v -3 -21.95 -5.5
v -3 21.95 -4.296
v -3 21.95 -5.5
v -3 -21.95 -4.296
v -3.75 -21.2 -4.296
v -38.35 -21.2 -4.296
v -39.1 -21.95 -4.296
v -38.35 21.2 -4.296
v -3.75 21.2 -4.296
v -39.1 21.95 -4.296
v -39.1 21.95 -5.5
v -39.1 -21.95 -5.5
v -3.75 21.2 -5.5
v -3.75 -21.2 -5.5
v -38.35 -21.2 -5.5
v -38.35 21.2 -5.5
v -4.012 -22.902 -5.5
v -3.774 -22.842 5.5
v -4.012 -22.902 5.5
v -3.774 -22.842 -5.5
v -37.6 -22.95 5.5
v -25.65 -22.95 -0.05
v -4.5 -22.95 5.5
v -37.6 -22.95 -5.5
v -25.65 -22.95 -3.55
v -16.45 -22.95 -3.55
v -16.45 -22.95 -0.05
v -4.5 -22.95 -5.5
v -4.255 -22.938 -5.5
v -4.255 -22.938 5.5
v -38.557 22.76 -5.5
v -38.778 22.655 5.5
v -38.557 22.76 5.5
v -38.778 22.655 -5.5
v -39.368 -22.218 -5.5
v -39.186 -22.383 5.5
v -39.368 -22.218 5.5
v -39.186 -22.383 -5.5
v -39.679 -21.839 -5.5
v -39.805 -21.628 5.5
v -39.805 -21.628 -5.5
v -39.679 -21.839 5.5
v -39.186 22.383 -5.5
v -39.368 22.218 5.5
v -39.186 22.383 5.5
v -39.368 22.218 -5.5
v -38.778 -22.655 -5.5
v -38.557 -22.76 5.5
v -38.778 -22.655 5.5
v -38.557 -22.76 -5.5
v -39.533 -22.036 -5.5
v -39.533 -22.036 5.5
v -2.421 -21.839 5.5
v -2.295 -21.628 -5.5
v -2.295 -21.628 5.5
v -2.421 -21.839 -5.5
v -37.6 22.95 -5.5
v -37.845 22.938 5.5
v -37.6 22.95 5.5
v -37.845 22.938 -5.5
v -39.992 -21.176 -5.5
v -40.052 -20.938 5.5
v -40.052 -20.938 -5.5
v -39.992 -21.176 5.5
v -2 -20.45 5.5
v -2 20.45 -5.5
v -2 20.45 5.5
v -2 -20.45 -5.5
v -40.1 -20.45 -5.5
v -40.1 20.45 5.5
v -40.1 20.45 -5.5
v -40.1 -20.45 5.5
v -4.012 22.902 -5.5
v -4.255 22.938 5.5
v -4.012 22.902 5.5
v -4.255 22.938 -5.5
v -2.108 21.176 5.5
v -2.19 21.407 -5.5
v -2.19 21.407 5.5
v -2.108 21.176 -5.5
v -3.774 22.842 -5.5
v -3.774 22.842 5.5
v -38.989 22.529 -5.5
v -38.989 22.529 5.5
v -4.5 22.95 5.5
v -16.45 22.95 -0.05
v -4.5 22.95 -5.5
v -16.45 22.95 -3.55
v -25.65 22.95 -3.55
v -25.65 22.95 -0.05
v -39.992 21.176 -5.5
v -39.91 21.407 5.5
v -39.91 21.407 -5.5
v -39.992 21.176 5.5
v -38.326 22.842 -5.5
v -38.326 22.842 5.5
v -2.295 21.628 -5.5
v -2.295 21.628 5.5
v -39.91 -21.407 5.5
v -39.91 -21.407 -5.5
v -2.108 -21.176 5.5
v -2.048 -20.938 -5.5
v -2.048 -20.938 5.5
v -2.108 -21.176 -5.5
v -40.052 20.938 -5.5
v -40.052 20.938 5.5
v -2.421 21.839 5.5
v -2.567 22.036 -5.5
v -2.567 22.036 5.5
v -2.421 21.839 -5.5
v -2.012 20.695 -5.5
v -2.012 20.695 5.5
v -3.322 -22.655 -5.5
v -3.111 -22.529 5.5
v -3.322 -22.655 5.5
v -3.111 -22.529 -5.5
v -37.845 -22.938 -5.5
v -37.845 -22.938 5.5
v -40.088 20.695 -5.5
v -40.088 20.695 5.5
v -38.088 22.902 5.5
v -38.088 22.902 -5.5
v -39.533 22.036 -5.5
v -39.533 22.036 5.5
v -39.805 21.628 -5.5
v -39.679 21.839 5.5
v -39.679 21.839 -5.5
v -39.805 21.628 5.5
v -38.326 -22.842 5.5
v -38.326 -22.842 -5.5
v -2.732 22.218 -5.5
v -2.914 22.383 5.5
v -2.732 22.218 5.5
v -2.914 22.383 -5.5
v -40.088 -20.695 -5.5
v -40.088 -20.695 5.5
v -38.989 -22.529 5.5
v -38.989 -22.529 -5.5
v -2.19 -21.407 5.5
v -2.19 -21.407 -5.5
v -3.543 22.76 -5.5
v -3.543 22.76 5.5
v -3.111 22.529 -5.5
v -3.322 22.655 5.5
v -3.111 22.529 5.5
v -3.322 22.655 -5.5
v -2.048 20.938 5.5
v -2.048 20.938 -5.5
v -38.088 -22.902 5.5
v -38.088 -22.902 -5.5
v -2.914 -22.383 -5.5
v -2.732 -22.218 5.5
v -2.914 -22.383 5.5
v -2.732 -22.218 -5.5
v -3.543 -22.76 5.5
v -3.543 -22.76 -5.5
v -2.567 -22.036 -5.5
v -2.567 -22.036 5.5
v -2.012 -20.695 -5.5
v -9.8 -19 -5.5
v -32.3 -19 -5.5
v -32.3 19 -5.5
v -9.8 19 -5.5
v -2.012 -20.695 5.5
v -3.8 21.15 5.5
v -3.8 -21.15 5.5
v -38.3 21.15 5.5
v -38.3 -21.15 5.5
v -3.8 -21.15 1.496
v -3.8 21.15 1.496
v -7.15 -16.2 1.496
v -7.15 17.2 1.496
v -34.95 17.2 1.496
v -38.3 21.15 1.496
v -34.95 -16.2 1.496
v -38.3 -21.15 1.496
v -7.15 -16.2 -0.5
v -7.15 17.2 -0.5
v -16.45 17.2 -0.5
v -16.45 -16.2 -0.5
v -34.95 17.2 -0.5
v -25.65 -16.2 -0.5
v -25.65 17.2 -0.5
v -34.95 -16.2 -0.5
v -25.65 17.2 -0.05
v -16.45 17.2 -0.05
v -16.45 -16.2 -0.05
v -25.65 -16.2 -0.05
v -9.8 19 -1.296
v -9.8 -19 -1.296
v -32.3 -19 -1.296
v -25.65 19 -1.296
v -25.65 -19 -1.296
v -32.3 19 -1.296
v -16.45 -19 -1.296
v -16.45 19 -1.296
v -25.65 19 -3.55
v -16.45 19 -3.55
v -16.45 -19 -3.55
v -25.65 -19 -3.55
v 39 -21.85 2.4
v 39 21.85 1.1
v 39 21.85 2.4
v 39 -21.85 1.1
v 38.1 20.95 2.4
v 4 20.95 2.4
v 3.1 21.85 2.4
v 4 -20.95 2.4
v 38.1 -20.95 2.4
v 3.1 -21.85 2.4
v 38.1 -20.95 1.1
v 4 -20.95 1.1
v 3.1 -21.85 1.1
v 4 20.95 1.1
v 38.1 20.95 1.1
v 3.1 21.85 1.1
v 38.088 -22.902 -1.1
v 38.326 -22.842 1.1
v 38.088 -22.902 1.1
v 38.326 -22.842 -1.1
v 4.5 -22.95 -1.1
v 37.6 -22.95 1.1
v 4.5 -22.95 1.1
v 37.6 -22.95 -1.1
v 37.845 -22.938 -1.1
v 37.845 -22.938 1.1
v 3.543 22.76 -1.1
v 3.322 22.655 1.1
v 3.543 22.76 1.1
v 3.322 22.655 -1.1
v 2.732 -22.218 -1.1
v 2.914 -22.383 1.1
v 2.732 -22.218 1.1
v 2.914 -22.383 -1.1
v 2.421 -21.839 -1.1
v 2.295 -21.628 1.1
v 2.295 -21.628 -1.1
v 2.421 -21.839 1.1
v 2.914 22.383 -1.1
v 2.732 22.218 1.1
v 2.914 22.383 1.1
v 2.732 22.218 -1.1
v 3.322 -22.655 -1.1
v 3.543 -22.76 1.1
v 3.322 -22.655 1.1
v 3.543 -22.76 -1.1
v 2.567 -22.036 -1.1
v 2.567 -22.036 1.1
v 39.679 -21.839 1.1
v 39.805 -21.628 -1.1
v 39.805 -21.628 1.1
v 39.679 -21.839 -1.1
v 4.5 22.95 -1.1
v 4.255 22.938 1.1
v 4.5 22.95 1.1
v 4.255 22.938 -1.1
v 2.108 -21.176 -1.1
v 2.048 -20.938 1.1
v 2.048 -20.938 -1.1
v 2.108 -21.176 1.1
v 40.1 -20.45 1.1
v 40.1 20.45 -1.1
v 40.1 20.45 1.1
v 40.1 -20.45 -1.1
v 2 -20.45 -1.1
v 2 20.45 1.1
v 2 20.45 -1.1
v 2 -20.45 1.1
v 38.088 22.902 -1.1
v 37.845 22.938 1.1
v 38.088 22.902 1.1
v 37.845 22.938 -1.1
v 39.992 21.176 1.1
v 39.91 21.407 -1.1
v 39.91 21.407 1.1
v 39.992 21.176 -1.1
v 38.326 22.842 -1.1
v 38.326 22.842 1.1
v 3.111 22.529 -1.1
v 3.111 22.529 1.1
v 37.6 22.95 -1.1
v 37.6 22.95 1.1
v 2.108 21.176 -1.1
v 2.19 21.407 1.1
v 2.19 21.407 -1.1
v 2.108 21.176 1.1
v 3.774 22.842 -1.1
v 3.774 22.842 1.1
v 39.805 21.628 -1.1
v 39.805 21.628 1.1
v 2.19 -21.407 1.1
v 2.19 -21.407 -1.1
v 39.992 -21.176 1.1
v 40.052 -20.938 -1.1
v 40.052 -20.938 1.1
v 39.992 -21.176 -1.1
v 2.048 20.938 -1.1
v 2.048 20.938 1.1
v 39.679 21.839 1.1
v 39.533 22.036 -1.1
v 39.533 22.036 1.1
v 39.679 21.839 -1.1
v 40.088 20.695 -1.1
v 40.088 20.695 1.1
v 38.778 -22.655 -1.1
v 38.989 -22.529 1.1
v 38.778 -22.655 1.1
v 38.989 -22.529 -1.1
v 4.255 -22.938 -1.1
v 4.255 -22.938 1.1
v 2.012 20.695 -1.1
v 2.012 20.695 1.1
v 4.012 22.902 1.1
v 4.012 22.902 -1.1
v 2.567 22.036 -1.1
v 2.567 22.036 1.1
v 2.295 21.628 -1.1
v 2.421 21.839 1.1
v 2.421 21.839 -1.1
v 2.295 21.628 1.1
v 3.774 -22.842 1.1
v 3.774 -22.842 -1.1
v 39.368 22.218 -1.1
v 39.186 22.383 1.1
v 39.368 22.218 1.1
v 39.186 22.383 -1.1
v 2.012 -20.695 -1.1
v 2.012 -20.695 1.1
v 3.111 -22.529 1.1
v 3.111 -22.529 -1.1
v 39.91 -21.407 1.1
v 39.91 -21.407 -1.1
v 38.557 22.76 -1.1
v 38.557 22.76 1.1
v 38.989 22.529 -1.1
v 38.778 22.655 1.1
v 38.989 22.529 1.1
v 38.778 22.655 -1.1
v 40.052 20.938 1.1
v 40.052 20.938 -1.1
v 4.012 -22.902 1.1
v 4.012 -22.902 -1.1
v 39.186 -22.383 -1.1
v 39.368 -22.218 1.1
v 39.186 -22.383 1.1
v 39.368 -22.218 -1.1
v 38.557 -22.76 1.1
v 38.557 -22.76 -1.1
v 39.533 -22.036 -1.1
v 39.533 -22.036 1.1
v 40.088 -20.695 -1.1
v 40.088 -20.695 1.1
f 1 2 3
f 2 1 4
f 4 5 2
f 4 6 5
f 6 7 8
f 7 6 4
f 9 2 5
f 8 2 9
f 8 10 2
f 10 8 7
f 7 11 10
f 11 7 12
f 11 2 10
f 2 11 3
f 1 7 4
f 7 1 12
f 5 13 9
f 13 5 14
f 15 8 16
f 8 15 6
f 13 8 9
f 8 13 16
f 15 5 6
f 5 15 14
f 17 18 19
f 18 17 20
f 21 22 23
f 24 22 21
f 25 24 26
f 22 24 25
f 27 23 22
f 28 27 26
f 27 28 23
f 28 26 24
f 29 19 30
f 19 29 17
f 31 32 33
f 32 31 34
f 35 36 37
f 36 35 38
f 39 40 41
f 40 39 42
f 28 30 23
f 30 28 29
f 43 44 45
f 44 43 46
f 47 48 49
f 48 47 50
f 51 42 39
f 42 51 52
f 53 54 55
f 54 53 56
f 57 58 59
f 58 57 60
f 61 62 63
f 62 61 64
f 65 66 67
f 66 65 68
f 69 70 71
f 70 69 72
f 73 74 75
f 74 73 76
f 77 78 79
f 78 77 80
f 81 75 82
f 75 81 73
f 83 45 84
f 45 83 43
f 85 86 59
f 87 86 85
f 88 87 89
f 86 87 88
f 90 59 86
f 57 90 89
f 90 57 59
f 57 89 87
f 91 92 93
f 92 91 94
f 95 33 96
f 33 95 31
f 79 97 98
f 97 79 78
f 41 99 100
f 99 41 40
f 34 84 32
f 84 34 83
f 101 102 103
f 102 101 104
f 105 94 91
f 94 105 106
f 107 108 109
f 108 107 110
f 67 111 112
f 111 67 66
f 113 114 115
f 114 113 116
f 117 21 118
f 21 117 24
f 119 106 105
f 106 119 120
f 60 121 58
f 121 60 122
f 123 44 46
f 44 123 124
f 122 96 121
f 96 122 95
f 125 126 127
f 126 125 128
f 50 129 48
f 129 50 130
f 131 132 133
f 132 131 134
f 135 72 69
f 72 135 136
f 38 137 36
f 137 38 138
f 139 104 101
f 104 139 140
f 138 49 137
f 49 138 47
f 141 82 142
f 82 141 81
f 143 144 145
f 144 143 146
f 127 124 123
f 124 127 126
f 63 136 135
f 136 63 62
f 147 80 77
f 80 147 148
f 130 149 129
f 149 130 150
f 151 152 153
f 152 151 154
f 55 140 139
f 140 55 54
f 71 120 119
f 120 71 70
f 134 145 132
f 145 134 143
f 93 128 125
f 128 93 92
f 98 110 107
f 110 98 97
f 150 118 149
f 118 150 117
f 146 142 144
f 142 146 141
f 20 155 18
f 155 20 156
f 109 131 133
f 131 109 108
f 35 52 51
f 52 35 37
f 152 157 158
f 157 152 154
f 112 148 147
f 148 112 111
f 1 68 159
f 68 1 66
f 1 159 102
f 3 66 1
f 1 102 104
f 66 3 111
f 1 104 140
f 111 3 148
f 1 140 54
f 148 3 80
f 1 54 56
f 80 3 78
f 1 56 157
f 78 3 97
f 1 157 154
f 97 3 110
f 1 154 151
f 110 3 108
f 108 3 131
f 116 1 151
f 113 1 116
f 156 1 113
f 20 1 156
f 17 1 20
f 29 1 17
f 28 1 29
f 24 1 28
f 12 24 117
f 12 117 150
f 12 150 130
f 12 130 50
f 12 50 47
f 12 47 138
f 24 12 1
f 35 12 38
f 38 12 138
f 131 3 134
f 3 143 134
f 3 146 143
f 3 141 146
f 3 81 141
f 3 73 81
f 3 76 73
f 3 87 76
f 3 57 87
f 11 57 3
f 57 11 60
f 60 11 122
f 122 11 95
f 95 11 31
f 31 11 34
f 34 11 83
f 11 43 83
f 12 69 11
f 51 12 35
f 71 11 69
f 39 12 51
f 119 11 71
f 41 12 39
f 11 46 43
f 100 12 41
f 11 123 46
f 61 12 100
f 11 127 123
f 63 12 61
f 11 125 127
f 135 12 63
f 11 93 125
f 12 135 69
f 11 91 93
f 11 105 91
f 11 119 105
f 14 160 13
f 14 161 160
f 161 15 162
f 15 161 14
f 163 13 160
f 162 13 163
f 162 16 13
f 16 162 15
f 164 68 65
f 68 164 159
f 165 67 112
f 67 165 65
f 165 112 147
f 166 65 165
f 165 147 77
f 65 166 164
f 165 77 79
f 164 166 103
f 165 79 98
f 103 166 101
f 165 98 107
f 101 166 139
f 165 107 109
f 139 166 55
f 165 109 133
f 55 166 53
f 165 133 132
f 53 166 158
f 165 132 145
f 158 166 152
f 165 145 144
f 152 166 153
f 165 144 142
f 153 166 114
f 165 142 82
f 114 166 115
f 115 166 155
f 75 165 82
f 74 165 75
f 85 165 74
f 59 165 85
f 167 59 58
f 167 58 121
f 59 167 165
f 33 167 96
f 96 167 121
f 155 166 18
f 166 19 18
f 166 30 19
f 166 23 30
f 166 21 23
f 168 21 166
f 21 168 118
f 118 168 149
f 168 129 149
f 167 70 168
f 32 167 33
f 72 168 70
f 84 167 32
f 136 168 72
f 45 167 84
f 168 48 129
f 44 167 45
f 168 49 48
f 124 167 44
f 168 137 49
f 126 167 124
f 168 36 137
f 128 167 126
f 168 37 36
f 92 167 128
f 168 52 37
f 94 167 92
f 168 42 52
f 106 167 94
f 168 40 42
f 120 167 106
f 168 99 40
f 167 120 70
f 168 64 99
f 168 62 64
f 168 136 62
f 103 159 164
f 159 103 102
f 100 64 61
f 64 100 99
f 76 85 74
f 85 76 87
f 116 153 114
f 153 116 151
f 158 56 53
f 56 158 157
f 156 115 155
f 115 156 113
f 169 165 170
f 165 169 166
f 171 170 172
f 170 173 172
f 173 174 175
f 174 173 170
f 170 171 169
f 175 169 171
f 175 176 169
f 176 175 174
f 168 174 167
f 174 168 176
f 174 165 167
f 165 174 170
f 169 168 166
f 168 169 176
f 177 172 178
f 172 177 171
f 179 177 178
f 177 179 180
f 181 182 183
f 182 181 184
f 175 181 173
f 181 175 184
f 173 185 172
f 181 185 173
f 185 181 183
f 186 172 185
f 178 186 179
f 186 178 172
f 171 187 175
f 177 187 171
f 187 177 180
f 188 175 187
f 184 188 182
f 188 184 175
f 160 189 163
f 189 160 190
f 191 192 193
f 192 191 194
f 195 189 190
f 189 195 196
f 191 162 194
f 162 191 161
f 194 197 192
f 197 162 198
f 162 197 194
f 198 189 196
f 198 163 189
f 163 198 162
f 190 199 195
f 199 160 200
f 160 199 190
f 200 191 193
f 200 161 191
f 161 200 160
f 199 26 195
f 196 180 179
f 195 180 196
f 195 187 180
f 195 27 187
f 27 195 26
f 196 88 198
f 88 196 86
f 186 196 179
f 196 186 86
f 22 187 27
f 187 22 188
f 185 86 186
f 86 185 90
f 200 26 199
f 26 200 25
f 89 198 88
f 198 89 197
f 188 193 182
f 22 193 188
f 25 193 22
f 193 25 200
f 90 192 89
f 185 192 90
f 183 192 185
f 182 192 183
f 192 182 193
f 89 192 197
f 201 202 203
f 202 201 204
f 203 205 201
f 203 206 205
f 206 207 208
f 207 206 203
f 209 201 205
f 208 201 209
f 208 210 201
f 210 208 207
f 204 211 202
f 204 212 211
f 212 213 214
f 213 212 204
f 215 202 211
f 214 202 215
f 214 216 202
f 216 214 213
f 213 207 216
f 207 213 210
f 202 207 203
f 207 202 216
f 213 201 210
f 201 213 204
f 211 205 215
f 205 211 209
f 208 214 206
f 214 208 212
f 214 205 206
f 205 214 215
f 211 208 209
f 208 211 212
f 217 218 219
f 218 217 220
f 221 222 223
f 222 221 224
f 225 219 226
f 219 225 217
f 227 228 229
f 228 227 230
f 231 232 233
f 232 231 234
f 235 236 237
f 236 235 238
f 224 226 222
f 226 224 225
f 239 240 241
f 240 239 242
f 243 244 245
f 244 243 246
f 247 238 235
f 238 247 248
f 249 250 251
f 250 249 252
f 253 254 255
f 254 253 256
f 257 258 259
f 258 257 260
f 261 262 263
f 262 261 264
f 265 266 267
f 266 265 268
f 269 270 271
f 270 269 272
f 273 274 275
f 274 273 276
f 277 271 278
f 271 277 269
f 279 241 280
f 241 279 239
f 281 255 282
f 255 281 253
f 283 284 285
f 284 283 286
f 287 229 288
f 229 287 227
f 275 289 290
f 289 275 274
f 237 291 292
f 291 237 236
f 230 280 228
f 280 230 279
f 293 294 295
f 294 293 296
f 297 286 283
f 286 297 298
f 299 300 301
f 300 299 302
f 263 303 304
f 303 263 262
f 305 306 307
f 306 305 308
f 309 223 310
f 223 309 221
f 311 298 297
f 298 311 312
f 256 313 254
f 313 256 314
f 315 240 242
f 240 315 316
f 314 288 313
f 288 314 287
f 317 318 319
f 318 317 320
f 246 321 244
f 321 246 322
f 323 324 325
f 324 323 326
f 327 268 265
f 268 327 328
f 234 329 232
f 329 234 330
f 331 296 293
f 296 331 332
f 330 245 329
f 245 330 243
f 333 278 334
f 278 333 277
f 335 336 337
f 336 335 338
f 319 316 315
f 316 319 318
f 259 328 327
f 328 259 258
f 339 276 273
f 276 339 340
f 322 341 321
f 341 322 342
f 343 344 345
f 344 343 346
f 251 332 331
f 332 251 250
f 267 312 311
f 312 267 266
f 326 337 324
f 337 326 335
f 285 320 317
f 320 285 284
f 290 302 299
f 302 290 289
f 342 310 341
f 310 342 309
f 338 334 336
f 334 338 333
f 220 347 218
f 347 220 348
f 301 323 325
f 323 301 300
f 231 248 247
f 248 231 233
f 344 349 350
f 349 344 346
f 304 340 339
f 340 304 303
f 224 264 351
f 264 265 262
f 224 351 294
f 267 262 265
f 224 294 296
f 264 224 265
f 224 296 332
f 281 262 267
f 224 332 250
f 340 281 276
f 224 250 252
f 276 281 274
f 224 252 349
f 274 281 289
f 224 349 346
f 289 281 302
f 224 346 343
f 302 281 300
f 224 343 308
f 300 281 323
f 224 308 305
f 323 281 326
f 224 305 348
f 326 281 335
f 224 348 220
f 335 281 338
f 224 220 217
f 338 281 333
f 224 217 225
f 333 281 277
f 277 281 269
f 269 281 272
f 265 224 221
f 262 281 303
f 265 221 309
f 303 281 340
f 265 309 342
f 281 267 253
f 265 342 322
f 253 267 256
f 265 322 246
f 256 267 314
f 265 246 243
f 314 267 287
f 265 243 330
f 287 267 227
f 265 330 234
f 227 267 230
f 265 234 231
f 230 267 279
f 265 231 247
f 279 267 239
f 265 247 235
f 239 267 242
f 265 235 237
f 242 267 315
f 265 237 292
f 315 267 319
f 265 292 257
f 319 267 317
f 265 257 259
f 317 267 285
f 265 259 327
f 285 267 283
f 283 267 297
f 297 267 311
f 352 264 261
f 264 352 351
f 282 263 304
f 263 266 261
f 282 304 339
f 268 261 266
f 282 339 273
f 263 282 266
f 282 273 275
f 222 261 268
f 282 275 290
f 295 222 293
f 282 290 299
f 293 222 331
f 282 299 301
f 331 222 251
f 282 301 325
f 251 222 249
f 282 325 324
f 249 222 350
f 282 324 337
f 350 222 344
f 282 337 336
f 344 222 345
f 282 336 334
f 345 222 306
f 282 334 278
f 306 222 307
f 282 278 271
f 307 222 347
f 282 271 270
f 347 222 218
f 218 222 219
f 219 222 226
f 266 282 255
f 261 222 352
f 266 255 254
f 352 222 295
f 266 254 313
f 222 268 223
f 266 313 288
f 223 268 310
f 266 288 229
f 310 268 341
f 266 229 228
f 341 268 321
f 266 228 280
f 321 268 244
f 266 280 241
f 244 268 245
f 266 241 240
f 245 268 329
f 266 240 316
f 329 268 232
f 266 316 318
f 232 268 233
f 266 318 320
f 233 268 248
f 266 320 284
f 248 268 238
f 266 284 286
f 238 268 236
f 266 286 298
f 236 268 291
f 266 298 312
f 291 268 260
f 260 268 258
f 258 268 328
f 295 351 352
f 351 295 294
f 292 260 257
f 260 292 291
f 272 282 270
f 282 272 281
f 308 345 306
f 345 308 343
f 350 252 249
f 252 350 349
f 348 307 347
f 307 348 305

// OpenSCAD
/*
 * ZMK Dongle Display Case — OpenSCAD
 * 1.69-inch flat display (ST7789V, 240×280 px)
 *
 * Display module specifications (typical 1.69" from AliExpress,
 * item 1005007346976745):
 *   PCB overall:   34.0 × 41.8 mm
 *   Active area:   27.8 × 33.4 mm (240 × 280 px)
 *   PCB thickness: 1.6 mm
 *   Module height: 3.7 mm (PCB + display glass stack)
 *
 * Case design inspired by carrefinho/prospector and BambuHelper.
 * Intended controller: Nice!nano v2 / Seeed XIAO nRF5340 (or similar).
 *
 * Usage:
 *   Set RENDER to one of:
 *     "body"  — main case body only
 *     "cap"   — rear snap-fit cap only
 *     "both"  — body + cap side-by-side (default, for preview)
 */

// ─── What to render ──────────────────────────────────────────────────────────
RENDER = "both";   // "body" | "cap" | "both"

// ─── Display module dimensions (1.69" ST7789V, 240×280) ──────────────────────
DISP_PCB_W        = 34.0;   // PCB width  (X)
DISP_PCB_H        = 41.8;   // PCB height (Y)
DISP_PCB_T        = 1.6;    // PCB thickness
DISP_GLASS_T      = 2.1;    // display glass + bezel thickness above PCB
DISP_TOTAL_T      = DISP_PCB_T + DISP_GLASS_T;   // ≈ 3.7 mm

DISP_WIN_W        = 27.8;   // active display window width  (X)
DISP_WIN_H        = 33.4;   // active display window height (Y)

// Active-area offset from PCB centre (horizontally centred,
// shifted 0.5 mm upward relative to PCB centre on this module)
DISP_WIN_OFFSET_X = 0.0;
DISP_WIN_OFFSET_Y = 0.5;

// ─── Case geometry constants ──────────────────────────────────────────────────
WALL       = 1.8;   // wall / shell thickness (mm)
CORNER_R   = 2.5;   // outer corner fillet radius (mm)

// Pocket for the display module (0.25 mm assembly clearance each side)
CLEARANCE  = 0.25;
POCKET_W   = DISP_PCB_W + 2 * CLEARANCE;       // 34.5 mm
POCKET_H   = DISP_PCB_H + 2 * CLEARANCE;       // 42.3 mm
POCKET_D   = DISP_TOTAL_T + 0.3;               // 4.0 mm — slight Z clearance

// Outer body dimensions
BODY_W  = POCKET_W + 2 * WALL;   // ≈ 38.1 mm
BODY_H  = POCKET_H + 2 * WALL;   // ≈ 45.9 mm
BODY_T  = POCKET_D + WALL + 5.2; // front wall + pocket + rear controller space ≈ 11.0 mm

// Controller cavity (Nice!nano / Seeed XIAO — 22 × 37 mm footprint)
CTRL_W  = 22.5;
CTRL_H  = 38.0;
CTRL_T  = 4.2;   // cavity depth

// USB-C port opening on the bottom edge (centred, 9.2 × 3.5 mm)
USB_W   = 9.2;
USB_H   = 3.5;
USB_Z_FROM_FRONT = WALL + POCKET_D + 1.5;  // distance from front face to USB centre

// Snap-fit groove around the rear opening (for rear cap)
GROOVE_D = 0.8;   // groove depth (into the wall)
GROOVE_H = 1.2;   // groove height (along Z)

// Rear cap dimensions
CAP_T    = 2.2;                  // total cap thickness
RIM_H    = GROOVE_H + 0.1;      // rim height that enters the groove
RIM_T    = GROOVE_D - 0.1;      // rim thickness (slight clearance)

// ─── $fn — global fragment count for smooth curves ───────────────────────────
$fn = 64;

// ─── Utility: rounded rectangle (2-D), centred at origin ─────────────────────
module rounded_rect(w, h, r) {
    offset(r = r)
        square([w - 2 * r, h - 2 * r], center = true);
}

// ─── Utility: rounded box (3-D), centred at origin ───────────────────────────
// Rounded only on the four vertical (Z) edges, matching the CadQuery design.
module rounded_box(w, h, d, r) {
    linear_extrude(height = d, center = true)
        rounded_rect(w, h, r);
}

// ─── Main case body ───────────────────────────────────────────────────────────
module main_body() {
    difference() {

        // 1. Outer shell — rounded box centred at origin
        rounded_box(BODY_W, BODY_H, BODY_T, CORNER_R);

        // 2. Display module pocket — recessed from the front face (+Z)
        //    The front face is at Z = +BODY_T/2.
        //    Pocket extends POCKET_D into the body.
        translate([0, 0, BODY_T/2 - POCKET_D/2 + 0.001])
            cube([POCKET_W, POCKET_H, POCKET_D + 0.01], center = true);

        // 3. Active-area window — cuts through the remaining front wall
        //    (thickness = WALL = 1.8 mm), centred at DISP_WIN_OFFSET.
        translate([DISP_WIN_OFFSET_X,
                   DISP_WIN_OFFSET_Y,
                   BODY_T/2 - POCKET_D - WALL/2])
            cube([DISP_WIN_W, DISP_WIN_H, WALL + 0.4], center = true);

        // 4. Controller cavity — recessed from the rear face (-Z)
        //    Rear face is at Z = -BODY_T/2.
        translate([0, 0, -BODY_T/2 + CTRL_T/2 - 0.001])
            cube([CTRL_W, CTRL_H, CTRL_T + 0.01], center = true);

        // 5. USB-C port slot on the bottom edge (-Y face)
        //    Z centre of the slot: distance USB_Z_FROM_FRONT from front face.
        usb_z = BODY_T/2 - USB_Z_FROM_FRONT;
        translate([0, 0, usb_z])
            cube([USB_W, BODY_H + 1.0, USB_H], center = true);

        // 6. Snap-fit groove around the rear rim
        //    Cut a frame-shaped channel just inside the rear opening edge.
        //    The groove runs from the rear face inward by GROOVE_H.
        groove_outer_w = BODY_W - 2 * (WALL - GROOVE_D);
        groove_outer_h = BODY_H - 2 * (WALL - GROOVE_D);
        groove_inner_w = BODY_W - 2 * WALL;
        groove_inner_h = BODY_H - 2 * WALL;

        translate([0, 0, -BODY_T/2 + GROOVE_H/2 - 0.001])
            difference() {
                cube([groove_outer_w, groove_outer_h, GROOVE_H + 0.01],
                     center = true);
                cube([groove_inner_w + 0.1, groove_inner_h + 0.1, GROOVE_H + 0.1],
                     center = true);
            }
    }
}

// ─── Rear snap-fit cap ────────────────────────────────────────────────────────
module rear_cap() {
    rim_outer_w = BODY_W - 2 * (WALL - GROOVE_D) - 0.2;
    rim_outer_h = BODY_H - 2 * (WALL - GROOVE_D) - 0.2;
    rim_inner_w = BODY_W - 2 * WALL - 0.4;
    rim_inner_h = BODY_H - 2 * WALL - 0.4;

    union() {
        // Base plate with rounded corners
        rounded_box(BODY_W, BODY_H, CAP_T, CORNER_R);

        // Inset rim on the inner face (+Z)
        translate([0, 0, CAP_T/2 + RIM_H/2])
            difference() {
                cube([rim_outer_w, rim_outer_h, RIM_H], center = true);
                cube([rim_inner_w, rim_inner_h, RIM_H + 0.1], center = true);
            }
    }
}

// ─── Top-level render selection ───────────────────────────────────────────────
if (RENDER == "body") {
    main_body();
} else if (RENDER == "cap") {
    rear_cap();
} else {
    // "both" — place side-by-side with a small gap
    translate([-BODY_W/2 - 2, 0, 0])
        main_body();
    translate([ BODY_W/2 + 2, 0, 0])
        rear_cap();
}
